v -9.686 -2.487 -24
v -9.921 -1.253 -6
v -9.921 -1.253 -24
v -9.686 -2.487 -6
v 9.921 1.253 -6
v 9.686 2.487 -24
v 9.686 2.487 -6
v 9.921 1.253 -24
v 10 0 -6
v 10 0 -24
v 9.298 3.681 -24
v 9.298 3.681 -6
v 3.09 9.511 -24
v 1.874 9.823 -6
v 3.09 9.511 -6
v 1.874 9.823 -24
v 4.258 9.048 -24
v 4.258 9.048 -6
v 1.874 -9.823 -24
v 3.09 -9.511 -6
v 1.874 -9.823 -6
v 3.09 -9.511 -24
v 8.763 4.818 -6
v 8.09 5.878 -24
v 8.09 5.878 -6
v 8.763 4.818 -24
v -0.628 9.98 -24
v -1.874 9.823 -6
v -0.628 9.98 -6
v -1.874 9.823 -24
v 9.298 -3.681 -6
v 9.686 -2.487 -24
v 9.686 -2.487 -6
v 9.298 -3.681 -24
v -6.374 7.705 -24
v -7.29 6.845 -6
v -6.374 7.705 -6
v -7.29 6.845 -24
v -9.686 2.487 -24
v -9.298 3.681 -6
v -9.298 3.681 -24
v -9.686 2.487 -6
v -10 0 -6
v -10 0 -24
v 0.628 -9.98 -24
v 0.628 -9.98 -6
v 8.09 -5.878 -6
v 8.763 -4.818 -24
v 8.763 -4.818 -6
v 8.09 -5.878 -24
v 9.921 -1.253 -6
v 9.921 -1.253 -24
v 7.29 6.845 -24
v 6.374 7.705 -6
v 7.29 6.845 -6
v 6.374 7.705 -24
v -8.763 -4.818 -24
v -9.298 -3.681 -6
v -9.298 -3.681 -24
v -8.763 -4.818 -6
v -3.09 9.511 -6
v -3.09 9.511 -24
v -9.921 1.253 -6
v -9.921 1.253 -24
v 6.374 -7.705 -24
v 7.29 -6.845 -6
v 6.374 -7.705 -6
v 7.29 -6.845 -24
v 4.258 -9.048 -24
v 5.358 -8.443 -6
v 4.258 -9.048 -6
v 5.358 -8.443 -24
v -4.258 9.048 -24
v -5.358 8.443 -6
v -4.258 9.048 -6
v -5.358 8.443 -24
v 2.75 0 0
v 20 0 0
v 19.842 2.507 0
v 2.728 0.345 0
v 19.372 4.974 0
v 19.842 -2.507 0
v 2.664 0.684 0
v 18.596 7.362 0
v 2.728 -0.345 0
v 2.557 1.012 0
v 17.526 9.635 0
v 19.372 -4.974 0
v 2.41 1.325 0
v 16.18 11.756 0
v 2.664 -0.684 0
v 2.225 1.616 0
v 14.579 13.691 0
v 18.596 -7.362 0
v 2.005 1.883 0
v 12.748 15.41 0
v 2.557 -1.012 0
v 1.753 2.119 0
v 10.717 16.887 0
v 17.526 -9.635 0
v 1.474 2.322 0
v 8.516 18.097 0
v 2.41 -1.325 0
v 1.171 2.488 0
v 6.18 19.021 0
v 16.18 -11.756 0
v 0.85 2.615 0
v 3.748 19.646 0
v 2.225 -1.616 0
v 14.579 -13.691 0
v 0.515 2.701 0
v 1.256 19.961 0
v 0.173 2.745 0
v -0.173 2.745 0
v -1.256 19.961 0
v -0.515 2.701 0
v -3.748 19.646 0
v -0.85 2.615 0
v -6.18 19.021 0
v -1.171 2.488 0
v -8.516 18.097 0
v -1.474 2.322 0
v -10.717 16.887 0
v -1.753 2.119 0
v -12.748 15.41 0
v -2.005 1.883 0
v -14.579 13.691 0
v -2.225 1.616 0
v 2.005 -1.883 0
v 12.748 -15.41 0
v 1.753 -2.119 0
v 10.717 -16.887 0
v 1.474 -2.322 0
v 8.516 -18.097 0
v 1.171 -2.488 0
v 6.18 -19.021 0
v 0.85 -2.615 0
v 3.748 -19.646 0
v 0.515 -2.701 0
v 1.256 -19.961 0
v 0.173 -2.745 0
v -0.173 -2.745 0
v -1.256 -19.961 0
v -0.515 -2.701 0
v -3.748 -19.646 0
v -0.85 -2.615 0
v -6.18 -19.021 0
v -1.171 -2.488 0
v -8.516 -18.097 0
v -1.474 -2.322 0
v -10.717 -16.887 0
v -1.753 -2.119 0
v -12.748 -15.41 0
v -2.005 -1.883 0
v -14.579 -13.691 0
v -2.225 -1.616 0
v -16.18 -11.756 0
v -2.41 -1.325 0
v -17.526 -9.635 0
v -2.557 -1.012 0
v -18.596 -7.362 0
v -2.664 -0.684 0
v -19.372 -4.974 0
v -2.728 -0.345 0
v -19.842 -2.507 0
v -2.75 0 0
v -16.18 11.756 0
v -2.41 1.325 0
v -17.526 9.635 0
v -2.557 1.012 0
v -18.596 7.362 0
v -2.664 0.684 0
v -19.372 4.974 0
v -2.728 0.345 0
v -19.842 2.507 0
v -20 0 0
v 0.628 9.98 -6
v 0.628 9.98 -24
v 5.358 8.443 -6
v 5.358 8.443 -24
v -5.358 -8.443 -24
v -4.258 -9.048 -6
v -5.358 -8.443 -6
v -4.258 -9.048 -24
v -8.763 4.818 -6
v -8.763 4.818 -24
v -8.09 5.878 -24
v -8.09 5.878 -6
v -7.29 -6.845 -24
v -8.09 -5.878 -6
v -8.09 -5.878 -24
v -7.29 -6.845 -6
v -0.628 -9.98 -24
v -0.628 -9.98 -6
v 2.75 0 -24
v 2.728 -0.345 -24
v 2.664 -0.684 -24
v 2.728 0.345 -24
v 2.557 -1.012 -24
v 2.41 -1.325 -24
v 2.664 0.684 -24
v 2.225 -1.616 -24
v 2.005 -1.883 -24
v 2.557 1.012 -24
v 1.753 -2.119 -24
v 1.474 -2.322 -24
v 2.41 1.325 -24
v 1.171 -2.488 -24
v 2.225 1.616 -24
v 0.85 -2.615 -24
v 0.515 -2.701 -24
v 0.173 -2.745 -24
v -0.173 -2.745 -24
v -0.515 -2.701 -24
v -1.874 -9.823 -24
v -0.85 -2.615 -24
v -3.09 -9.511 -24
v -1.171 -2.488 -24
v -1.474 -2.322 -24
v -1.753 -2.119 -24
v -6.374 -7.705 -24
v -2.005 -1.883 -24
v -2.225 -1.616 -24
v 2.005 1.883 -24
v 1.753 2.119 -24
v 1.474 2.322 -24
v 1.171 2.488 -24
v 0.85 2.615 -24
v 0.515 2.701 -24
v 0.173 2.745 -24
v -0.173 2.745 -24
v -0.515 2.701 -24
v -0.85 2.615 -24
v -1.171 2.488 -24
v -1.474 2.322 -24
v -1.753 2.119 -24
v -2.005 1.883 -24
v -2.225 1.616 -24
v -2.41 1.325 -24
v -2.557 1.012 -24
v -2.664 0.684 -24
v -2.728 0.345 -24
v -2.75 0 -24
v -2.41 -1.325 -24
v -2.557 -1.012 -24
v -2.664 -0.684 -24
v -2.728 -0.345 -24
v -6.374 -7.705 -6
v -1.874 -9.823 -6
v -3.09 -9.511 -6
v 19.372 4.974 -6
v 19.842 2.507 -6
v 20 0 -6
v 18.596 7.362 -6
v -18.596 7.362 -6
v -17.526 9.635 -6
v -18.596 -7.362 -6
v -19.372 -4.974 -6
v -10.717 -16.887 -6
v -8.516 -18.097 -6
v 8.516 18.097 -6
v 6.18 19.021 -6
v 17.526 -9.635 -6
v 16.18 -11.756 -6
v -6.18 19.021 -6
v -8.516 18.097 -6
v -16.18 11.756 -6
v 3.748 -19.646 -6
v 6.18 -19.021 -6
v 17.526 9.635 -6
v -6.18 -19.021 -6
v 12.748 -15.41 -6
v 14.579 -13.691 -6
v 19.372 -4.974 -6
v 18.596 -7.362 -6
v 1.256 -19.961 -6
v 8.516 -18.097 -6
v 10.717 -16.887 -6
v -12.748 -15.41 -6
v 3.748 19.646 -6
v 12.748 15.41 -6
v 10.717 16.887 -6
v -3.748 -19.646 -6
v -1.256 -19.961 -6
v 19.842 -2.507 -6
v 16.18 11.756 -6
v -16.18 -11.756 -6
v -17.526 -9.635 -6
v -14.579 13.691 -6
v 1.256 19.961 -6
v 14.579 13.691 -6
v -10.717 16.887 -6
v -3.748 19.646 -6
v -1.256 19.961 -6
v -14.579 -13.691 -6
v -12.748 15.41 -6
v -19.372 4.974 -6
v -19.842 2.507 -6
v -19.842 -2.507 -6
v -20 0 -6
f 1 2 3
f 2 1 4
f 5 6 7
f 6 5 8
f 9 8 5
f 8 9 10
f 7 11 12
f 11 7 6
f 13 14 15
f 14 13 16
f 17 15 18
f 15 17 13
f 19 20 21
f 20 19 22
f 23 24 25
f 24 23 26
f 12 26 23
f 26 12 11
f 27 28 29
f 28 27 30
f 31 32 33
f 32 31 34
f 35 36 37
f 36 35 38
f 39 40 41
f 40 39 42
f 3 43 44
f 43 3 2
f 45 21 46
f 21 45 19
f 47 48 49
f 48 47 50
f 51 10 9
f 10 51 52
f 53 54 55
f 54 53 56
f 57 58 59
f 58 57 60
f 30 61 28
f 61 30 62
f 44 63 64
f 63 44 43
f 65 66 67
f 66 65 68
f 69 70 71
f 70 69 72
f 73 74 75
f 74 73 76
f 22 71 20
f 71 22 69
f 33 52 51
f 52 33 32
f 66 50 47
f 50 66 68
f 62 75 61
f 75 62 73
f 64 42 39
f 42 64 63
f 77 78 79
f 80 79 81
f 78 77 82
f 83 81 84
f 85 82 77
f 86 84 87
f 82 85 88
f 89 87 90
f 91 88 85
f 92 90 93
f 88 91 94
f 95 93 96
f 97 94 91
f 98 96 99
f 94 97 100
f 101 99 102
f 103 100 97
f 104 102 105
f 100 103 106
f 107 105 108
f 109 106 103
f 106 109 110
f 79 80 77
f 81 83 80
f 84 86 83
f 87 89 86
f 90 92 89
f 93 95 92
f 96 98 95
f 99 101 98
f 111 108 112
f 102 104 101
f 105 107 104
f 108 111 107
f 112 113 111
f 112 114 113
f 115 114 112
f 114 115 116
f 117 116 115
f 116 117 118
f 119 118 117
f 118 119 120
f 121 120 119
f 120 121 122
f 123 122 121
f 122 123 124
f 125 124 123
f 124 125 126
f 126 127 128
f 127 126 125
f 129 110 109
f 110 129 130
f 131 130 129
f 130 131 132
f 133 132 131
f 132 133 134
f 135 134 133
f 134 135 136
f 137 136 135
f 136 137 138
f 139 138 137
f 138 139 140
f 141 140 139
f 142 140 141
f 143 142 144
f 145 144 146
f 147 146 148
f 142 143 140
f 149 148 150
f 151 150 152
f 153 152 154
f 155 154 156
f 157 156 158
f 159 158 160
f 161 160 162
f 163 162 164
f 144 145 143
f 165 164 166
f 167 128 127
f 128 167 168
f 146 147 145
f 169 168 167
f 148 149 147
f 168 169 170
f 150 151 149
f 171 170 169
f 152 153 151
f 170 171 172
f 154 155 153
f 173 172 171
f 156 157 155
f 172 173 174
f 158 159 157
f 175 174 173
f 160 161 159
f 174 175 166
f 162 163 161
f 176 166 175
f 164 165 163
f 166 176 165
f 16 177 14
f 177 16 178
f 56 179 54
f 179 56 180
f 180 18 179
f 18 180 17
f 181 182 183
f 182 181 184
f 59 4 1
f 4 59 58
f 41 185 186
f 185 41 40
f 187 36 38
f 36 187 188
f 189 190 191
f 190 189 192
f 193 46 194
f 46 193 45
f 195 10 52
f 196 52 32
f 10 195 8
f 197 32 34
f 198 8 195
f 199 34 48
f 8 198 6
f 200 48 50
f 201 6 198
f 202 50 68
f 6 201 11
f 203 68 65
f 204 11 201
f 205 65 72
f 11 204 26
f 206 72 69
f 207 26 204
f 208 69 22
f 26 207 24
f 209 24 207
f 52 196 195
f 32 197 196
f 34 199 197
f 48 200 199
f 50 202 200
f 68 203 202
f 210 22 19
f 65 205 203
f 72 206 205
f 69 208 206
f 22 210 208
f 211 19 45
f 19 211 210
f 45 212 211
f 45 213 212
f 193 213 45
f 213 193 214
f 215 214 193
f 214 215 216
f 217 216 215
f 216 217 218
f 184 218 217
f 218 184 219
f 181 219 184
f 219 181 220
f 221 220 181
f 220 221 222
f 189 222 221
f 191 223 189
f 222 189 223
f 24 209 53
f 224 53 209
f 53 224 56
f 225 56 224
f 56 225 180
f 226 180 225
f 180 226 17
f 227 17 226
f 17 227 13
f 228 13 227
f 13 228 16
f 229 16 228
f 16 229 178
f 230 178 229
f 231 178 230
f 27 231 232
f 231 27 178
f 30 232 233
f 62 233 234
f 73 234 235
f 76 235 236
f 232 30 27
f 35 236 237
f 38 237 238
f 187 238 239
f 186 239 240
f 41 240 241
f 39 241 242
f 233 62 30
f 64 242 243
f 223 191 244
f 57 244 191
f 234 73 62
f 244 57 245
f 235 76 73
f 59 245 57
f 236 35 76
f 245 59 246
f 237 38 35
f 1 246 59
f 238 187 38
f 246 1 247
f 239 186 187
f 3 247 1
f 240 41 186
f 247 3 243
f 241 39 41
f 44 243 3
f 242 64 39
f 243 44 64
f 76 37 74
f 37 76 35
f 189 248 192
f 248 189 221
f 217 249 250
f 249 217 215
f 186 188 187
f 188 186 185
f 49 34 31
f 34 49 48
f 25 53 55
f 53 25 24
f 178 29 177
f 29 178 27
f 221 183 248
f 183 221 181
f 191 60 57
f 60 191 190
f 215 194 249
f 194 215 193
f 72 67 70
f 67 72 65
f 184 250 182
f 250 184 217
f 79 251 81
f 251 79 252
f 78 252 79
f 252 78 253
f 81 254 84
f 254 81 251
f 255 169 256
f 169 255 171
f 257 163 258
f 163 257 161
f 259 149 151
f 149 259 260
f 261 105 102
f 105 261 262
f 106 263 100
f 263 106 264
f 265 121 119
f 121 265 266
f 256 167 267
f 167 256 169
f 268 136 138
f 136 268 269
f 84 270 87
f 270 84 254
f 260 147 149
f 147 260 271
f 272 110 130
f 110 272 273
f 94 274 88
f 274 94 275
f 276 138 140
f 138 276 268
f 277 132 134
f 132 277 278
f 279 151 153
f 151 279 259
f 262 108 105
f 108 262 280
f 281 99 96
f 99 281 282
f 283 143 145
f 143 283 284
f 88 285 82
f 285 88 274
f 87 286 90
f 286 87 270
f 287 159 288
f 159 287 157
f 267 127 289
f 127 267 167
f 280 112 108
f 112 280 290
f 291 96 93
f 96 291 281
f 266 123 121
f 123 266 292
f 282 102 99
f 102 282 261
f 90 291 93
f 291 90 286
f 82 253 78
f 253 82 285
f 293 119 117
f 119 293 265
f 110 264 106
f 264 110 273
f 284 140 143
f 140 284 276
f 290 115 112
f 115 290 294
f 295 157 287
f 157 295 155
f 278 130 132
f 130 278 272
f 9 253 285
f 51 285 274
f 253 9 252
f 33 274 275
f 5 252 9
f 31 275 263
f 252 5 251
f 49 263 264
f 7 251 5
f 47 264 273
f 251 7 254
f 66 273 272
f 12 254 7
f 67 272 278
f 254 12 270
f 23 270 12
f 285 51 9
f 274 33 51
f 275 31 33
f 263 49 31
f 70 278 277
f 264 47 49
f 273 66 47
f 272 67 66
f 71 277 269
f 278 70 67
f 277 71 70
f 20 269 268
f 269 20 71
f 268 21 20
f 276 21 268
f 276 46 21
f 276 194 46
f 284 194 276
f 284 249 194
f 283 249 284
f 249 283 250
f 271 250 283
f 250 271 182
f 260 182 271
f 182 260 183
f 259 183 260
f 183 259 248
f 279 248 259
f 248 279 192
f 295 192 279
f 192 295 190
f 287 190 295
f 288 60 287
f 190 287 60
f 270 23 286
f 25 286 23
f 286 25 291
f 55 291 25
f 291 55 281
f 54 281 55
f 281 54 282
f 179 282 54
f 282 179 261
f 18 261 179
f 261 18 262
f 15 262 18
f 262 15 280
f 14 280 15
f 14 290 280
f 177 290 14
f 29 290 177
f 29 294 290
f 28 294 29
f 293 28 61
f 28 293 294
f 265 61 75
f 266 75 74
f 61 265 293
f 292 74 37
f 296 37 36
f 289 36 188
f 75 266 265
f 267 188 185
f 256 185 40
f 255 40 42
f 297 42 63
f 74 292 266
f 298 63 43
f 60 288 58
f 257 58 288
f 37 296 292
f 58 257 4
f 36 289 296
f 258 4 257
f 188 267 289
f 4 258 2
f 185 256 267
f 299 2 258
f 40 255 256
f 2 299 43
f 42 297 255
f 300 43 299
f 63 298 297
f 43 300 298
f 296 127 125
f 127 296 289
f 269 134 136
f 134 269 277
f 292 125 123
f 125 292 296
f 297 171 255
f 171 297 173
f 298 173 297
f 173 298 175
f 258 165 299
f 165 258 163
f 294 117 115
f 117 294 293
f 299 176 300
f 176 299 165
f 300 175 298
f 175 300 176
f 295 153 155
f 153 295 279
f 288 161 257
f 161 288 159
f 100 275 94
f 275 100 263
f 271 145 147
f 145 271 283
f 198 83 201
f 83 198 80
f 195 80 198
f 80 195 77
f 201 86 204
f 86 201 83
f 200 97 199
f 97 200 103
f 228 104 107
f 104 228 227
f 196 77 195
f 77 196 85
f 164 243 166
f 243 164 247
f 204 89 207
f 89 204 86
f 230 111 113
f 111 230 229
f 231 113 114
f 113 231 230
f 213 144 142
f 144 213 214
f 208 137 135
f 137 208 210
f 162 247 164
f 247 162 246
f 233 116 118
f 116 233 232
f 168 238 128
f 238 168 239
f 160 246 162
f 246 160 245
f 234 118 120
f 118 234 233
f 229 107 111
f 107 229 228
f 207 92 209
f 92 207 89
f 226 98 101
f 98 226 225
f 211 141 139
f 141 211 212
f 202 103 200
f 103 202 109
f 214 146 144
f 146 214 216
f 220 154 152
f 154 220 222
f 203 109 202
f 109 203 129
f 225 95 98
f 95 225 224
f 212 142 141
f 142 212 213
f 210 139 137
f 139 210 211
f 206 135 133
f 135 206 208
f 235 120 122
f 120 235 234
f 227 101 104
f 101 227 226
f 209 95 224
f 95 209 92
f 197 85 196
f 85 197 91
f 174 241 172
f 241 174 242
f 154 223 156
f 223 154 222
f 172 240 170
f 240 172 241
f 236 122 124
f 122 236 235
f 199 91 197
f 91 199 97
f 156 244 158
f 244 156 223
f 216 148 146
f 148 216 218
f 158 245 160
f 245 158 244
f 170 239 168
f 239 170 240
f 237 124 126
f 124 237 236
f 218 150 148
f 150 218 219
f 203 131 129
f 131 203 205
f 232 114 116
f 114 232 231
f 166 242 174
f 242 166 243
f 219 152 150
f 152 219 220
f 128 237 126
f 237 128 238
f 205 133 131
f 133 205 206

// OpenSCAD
$fn = 50;


difference() {
	union() {
		translate(v = [0, 0, -24.0000000000]) {
			cylinder(h = 24, r = 10.0000000000);
		}
		translate(v = [0, 0, -6.0000000000]) {
			cylinder(h = 6, r = 20.0000000000);
		}
	}
	union() {
		#translate(v = [0, 0, -24]) {
			cylinder(h = 24, r = 2.7500000000);
		}
	}
}
